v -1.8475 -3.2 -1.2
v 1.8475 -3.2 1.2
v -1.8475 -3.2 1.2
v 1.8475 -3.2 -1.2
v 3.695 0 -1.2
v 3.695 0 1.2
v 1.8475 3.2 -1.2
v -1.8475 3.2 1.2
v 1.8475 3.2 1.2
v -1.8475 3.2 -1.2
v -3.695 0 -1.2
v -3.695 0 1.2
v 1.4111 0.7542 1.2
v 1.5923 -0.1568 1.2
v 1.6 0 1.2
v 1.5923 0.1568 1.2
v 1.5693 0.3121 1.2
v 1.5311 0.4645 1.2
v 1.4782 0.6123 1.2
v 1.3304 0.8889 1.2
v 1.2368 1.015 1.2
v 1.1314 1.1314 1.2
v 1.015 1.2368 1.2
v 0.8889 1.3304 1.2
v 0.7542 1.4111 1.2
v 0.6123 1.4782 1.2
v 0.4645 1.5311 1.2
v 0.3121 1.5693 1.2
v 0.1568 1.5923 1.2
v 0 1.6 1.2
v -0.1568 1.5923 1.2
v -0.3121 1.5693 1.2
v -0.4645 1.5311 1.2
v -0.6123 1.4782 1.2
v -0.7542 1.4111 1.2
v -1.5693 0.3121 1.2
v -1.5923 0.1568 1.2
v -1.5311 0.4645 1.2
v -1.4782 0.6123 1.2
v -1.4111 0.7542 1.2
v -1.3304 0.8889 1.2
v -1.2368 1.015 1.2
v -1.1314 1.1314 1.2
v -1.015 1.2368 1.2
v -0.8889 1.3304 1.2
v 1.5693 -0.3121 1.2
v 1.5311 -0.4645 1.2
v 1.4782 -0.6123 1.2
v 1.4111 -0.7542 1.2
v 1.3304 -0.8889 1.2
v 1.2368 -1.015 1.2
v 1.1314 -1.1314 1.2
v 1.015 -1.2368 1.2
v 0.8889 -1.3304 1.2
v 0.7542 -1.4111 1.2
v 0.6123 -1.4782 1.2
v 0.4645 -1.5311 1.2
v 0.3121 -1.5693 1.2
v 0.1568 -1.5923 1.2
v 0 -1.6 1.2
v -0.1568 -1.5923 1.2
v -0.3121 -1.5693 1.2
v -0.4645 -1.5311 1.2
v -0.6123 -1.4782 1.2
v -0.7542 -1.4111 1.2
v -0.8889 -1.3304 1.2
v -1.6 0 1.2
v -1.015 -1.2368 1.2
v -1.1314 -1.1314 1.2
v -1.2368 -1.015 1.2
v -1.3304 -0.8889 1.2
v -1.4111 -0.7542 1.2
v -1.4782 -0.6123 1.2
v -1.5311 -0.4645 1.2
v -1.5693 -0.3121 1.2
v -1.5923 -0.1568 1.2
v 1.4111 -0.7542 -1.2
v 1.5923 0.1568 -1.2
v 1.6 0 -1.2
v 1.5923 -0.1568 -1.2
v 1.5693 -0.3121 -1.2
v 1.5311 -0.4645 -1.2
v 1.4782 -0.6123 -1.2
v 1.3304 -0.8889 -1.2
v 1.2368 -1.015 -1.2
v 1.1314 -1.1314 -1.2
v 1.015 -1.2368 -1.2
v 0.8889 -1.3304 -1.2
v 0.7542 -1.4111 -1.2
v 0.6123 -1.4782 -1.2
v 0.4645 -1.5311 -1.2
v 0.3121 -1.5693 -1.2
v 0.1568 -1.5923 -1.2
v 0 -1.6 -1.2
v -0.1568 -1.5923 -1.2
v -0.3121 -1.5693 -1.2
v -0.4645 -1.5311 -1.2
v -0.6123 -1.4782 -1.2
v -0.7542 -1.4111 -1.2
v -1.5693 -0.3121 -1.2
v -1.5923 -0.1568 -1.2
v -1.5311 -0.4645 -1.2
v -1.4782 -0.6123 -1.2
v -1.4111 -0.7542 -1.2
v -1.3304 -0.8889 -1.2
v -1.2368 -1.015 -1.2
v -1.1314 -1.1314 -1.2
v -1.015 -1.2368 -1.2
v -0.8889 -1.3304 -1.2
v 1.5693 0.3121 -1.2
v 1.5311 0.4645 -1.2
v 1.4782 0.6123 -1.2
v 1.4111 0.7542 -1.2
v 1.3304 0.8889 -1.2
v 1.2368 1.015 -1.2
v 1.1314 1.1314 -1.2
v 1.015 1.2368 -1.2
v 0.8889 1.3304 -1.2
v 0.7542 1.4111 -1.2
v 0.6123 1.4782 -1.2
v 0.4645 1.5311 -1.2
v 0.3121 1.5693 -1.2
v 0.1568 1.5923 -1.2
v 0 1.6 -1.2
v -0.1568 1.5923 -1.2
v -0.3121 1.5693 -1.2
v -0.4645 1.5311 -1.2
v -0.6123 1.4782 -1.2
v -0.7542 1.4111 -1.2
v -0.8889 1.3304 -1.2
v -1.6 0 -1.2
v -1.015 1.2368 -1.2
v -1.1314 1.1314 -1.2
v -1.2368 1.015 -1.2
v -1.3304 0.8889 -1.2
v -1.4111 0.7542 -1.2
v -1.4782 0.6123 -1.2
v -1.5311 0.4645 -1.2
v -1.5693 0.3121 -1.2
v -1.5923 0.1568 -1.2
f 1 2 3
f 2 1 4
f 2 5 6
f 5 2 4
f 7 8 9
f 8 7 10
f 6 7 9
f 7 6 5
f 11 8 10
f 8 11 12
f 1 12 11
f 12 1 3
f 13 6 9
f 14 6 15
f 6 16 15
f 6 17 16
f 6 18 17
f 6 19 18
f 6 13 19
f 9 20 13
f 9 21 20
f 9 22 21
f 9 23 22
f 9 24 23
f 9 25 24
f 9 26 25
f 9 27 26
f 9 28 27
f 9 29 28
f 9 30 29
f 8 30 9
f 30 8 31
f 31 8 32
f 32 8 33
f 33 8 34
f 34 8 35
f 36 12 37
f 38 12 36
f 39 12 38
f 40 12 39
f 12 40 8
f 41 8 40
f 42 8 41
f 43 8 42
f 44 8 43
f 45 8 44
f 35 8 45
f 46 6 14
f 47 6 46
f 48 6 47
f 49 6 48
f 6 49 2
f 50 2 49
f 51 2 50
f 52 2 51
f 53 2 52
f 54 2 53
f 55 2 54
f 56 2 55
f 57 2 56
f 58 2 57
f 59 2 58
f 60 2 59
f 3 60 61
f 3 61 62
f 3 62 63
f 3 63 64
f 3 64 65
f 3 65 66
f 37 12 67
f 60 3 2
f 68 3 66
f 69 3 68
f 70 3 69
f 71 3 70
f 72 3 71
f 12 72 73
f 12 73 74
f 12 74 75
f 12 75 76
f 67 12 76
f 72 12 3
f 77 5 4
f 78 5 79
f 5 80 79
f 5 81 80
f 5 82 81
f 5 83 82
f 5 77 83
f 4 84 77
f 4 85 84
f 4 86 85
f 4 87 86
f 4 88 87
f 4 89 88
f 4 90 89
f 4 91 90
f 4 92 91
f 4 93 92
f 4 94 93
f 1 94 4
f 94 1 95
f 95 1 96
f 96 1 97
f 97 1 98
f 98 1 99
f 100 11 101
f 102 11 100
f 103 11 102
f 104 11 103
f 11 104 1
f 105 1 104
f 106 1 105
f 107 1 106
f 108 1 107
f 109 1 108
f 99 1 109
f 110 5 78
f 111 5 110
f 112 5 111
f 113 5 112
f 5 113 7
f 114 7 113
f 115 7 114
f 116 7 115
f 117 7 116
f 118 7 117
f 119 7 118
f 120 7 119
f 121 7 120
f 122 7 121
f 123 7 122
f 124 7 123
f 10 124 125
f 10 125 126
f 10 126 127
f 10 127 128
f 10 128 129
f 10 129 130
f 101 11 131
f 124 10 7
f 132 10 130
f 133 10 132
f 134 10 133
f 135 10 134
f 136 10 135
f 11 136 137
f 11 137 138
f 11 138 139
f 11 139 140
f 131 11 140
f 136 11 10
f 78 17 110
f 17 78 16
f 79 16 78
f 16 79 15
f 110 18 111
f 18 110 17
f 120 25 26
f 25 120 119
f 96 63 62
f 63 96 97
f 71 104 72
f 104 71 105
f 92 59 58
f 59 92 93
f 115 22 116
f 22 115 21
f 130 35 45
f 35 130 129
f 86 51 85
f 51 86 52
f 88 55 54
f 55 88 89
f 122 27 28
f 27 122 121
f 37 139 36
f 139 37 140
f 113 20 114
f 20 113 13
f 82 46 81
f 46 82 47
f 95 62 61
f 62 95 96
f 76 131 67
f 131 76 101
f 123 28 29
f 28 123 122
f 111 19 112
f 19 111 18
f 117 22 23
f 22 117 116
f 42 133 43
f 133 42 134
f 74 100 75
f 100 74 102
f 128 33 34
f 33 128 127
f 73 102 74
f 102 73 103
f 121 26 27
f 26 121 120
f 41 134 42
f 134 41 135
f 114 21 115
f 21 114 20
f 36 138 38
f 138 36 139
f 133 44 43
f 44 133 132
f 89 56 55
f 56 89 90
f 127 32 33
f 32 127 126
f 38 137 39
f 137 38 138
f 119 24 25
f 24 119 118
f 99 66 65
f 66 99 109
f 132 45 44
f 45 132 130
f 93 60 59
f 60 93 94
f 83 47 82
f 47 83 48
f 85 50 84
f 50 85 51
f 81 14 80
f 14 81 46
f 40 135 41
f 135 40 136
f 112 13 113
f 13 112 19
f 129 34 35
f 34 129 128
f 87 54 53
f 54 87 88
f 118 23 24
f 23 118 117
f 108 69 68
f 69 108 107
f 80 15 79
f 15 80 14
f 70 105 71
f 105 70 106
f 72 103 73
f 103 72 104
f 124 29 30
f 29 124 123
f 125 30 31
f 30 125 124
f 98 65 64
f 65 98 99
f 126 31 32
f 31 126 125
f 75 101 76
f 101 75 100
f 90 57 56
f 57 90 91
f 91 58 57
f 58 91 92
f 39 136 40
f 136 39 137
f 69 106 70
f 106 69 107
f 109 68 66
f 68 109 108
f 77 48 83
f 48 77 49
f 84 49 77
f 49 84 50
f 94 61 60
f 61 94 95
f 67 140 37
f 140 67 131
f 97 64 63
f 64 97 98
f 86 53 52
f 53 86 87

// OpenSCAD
// Hex nut for M3 screw
// Target: 6.4mm across flats, 2.4mm thick, ~3.0mm internal hole (with clearance)

thread_diameter_mm   = 3.0;  // nominal screw diameter
across_flats_mm      = 6.4;  // AF
thickness_mm         = 2.4;  // height
hole_clearance_mm    = 0.2;  // radial clearance for printed hole
eps_mm               = 0.05; // small overlap for robust boolean ops

// Derived radii
hex_circumradius_mm = across_flats_mm / sqrt(3);                 // R such that AF = sqrt(3)*R
hole_radius_mm      = (thread_diameter_mm + hole_clearance_mm)/2;

module hex_nut() {
    difference() {
        // Hex body (one connected solid)
        cylinder(r=hex_circumradius_mm, h=thickness_mm, center=true, $fn=6);

        // Through hole (slightly taller to guarantee clean cut)
        cylinder(r=hole_radius_mm, h=thickness_mm + 2*eps_mm, center=true, $fn=64);
    }
}

hex_nut();
